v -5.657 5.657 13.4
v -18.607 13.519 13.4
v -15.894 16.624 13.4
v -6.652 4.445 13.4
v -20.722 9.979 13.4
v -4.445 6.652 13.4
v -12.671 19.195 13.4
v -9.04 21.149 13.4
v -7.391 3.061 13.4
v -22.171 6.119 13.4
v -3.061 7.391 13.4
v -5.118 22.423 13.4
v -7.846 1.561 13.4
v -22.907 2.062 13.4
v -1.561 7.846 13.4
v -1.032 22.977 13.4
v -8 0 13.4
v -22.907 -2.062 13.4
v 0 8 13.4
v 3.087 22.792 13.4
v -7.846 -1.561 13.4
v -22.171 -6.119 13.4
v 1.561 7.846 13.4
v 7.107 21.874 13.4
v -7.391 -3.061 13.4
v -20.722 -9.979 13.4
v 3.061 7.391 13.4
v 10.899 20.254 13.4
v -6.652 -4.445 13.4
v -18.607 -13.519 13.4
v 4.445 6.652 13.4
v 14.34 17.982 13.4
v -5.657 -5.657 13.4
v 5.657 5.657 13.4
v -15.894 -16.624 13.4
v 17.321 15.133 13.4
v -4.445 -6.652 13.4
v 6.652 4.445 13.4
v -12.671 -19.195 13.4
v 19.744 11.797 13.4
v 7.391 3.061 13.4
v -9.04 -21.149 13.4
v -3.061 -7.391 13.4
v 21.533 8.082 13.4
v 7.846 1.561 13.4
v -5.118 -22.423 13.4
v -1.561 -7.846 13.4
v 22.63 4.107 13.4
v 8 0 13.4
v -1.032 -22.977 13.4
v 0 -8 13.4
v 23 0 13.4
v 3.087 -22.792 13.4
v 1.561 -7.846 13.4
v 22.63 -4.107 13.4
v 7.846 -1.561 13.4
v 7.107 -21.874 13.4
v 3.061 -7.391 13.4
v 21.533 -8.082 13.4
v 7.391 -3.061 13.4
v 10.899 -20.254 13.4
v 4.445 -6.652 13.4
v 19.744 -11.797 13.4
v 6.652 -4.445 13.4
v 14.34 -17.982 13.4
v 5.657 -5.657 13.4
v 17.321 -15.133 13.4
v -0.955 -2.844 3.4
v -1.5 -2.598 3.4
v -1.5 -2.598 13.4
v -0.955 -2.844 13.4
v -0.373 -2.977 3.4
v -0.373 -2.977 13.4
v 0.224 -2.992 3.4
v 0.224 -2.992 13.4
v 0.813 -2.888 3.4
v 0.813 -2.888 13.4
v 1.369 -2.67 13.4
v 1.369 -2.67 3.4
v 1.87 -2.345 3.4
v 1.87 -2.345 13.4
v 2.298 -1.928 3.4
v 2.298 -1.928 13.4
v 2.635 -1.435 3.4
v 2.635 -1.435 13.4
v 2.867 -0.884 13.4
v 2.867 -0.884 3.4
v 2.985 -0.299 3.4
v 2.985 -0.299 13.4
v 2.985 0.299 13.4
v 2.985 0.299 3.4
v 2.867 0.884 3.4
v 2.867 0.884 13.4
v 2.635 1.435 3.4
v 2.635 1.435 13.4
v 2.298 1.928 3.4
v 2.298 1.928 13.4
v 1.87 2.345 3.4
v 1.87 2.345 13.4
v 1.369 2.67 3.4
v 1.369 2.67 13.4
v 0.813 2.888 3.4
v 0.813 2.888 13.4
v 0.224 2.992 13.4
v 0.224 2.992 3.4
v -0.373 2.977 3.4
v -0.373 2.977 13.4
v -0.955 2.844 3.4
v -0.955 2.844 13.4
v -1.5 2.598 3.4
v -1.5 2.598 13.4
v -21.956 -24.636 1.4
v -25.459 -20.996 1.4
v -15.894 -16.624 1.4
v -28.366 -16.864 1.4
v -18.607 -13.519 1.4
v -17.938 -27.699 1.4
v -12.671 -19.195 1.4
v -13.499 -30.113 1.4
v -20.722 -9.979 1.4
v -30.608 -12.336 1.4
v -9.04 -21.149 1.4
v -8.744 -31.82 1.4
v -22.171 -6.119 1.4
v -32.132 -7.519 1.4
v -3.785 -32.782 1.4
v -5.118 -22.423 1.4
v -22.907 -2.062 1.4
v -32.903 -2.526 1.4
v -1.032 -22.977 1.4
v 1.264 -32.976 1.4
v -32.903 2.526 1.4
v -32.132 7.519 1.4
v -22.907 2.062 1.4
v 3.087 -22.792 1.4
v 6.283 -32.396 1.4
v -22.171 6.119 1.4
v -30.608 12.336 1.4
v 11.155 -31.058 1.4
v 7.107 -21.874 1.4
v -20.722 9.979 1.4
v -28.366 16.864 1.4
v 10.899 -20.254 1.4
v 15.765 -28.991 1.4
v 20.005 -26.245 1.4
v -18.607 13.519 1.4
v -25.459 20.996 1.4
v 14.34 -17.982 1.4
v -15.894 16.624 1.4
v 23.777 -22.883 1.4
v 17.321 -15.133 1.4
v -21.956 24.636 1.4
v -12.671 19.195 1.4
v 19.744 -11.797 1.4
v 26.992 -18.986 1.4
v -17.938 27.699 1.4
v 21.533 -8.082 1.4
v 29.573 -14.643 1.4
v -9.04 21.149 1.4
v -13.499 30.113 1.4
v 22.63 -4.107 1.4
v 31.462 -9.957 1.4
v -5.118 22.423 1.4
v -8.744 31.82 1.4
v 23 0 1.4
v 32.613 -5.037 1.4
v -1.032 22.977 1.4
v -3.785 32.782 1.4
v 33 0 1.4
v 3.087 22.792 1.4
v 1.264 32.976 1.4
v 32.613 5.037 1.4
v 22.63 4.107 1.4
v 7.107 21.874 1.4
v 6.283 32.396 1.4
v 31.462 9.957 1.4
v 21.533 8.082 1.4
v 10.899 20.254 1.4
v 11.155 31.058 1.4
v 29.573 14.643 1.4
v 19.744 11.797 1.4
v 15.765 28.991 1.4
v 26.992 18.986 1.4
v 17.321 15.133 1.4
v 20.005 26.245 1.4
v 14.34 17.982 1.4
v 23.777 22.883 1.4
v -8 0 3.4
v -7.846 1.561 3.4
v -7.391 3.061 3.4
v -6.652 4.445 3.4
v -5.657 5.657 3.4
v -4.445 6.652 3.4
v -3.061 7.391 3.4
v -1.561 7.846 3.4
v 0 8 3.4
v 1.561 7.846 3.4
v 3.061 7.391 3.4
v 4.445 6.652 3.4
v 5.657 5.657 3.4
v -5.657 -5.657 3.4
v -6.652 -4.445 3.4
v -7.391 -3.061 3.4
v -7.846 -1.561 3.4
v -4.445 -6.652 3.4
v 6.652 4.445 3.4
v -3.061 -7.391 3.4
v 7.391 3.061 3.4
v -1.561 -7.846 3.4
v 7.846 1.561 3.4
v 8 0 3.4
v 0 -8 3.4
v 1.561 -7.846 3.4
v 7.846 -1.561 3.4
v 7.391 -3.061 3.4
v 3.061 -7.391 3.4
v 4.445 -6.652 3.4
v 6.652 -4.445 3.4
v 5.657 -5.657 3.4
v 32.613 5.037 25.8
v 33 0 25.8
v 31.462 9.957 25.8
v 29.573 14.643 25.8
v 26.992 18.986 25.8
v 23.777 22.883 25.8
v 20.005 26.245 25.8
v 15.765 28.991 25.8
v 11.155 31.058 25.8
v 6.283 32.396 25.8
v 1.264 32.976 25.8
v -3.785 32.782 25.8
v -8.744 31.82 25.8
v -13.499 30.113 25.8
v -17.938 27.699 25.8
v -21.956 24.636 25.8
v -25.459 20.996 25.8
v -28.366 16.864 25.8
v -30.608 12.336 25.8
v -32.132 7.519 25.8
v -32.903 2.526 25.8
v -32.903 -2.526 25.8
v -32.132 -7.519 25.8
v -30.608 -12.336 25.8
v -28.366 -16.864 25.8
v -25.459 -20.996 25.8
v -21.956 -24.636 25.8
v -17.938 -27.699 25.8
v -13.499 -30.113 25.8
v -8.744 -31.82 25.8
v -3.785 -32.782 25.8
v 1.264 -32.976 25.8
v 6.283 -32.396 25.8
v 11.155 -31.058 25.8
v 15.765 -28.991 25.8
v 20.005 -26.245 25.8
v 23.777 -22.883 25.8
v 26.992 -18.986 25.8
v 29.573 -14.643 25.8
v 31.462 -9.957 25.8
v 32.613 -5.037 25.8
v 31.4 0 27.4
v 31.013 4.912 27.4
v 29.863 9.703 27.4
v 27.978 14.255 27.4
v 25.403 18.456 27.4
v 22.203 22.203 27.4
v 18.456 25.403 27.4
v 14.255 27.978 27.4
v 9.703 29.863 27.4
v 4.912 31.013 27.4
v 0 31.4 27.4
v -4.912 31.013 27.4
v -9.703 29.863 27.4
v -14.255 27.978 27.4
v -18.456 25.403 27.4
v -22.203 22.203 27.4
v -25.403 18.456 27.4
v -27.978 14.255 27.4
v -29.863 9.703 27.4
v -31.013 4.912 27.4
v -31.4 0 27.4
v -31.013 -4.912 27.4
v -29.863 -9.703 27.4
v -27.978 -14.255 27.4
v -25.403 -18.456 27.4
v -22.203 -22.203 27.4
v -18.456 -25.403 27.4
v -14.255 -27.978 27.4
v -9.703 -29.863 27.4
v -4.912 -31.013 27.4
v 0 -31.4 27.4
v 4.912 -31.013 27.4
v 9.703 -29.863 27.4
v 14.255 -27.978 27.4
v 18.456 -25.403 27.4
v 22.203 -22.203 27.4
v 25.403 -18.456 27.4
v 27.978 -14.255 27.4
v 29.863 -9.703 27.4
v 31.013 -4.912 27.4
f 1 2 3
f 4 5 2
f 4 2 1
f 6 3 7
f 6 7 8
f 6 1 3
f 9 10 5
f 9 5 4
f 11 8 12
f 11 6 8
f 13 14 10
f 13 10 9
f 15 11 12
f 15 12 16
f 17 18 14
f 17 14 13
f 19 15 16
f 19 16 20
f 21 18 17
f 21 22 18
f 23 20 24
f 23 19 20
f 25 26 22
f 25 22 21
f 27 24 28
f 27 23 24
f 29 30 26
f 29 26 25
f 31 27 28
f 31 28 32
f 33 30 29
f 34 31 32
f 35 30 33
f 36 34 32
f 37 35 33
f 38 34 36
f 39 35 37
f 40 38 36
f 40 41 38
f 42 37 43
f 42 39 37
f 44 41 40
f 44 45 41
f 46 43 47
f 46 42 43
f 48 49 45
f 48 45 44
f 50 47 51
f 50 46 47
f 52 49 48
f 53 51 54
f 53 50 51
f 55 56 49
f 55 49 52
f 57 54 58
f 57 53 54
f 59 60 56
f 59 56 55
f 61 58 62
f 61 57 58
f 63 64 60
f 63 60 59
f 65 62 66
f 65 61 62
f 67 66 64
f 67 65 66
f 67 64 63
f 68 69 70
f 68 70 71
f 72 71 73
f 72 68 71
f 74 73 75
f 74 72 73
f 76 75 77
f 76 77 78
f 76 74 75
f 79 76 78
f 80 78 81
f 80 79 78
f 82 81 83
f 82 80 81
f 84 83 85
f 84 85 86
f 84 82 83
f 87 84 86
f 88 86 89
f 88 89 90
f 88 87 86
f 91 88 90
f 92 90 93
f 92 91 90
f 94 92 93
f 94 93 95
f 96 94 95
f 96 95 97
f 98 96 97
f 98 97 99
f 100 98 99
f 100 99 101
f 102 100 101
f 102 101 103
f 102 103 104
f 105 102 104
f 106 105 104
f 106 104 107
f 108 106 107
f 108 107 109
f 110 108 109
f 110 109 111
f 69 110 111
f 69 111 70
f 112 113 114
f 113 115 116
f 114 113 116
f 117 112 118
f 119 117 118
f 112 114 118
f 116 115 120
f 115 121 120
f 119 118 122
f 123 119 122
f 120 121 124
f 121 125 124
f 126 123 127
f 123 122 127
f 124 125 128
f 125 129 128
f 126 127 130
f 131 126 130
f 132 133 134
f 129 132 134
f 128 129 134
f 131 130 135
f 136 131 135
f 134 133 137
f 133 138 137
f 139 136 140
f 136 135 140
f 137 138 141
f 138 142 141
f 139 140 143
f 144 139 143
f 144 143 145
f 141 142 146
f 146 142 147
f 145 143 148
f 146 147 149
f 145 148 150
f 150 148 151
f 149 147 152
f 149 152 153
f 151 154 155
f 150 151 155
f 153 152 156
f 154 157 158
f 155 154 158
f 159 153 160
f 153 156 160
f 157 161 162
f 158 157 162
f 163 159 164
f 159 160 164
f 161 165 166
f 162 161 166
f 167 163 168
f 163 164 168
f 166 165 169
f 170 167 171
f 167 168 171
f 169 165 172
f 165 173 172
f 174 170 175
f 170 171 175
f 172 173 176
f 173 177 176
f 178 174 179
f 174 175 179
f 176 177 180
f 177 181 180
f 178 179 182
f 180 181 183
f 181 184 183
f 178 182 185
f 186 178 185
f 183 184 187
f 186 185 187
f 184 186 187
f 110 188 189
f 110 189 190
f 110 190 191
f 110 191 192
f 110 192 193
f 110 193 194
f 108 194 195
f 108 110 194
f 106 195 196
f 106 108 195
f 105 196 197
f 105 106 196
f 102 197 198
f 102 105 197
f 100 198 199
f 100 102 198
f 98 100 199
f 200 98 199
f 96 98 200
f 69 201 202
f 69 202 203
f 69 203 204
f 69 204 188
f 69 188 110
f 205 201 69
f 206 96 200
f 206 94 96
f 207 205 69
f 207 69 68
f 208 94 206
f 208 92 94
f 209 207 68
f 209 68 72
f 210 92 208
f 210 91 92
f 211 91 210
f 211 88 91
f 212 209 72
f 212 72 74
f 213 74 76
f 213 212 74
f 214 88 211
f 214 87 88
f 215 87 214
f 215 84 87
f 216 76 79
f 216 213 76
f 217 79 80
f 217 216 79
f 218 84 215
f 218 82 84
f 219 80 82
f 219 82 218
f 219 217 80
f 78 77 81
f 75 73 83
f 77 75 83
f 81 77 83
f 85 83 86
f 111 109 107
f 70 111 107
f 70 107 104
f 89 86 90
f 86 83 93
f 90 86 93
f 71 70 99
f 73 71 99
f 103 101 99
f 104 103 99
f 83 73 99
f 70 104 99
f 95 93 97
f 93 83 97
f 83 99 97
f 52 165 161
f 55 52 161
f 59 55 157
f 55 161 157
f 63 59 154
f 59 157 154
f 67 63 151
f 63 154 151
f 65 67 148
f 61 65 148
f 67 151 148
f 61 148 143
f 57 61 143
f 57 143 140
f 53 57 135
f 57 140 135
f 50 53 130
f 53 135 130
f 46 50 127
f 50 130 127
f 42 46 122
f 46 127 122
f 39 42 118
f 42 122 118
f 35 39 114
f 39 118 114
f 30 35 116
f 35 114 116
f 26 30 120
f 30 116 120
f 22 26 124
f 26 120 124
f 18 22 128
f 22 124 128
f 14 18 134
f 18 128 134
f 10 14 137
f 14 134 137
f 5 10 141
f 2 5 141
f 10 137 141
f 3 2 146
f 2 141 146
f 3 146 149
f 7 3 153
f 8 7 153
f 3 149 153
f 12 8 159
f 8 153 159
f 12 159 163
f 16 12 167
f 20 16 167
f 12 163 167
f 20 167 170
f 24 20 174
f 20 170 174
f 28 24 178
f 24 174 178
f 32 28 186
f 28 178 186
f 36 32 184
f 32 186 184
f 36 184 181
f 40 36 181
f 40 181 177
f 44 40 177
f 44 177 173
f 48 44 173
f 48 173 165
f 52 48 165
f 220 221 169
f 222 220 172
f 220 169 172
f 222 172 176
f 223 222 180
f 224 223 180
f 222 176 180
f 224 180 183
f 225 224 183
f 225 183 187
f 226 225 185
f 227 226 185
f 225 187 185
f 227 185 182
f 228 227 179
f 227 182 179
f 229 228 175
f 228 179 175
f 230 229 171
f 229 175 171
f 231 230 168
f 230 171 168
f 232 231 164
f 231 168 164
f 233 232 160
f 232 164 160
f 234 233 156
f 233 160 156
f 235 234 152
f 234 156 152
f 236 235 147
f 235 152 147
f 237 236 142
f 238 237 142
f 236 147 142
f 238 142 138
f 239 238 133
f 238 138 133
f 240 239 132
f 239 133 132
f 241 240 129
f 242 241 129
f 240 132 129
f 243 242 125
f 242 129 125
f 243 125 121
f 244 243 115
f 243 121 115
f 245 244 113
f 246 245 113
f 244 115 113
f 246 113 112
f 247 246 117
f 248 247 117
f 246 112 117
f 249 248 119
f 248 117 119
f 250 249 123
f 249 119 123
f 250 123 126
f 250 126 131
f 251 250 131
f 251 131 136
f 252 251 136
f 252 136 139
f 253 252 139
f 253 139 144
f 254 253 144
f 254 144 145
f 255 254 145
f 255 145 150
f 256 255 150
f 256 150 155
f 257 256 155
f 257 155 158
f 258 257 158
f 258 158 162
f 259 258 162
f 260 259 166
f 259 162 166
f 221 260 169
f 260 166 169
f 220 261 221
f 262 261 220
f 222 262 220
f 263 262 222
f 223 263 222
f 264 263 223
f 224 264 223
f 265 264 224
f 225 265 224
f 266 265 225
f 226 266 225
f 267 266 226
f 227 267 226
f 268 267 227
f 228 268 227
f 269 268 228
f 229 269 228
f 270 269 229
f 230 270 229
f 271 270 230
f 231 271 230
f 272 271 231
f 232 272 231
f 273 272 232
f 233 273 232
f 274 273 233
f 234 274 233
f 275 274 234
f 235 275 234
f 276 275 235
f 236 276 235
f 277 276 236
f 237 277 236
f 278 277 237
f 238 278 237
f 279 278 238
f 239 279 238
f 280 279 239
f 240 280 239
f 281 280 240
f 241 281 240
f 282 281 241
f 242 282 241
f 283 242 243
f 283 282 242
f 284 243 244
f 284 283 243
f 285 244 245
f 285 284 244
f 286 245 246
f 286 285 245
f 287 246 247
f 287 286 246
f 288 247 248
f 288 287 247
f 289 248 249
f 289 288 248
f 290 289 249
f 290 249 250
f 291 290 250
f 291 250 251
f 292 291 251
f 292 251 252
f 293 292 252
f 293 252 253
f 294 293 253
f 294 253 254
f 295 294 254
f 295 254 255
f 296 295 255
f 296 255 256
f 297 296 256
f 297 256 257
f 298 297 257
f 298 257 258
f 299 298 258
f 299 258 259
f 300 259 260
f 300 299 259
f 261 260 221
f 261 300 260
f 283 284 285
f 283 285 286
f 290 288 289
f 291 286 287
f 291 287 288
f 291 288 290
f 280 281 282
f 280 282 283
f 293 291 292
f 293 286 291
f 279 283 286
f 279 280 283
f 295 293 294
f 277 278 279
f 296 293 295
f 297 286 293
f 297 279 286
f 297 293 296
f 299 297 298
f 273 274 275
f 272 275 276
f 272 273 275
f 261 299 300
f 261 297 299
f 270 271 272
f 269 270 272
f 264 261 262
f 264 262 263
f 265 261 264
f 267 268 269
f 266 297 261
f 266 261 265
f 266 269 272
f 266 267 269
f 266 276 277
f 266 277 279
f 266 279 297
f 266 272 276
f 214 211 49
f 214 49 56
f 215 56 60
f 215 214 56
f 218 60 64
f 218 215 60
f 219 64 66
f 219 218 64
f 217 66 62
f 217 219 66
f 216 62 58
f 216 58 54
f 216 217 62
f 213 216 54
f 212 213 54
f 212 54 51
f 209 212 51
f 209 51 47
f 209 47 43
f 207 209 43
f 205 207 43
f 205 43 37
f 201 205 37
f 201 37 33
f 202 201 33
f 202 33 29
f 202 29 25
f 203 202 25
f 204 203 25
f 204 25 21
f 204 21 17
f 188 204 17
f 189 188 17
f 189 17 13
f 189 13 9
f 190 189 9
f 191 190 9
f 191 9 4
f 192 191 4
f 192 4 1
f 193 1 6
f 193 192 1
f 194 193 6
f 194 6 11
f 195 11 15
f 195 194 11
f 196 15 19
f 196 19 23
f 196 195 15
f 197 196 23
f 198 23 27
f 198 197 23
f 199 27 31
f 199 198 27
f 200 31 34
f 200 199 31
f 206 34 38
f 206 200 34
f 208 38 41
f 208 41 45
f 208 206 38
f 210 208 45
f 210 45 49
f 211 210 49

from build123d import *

# Parameters (mm, degrees)
SKETCH_R        = 33
PAD_DEPTH       = 26
POCKET_DEPTH    = 12
SKETCH002_R     = 23
SKETCH002_R_2   = 8
POCKET001_DEPTH = 12
SKETCH003_R     = 8
POCKET002_DEPTH = 2
CHAMFER_SIZE    = 1.6


with BuildPart() as part:
    # Sketch → Pad (new body)
    with BuildSketch(Plane.XY):
        Circle(SKETCH_R)
    extrude(amount=PAD_DEPTH)

    # Sketch001 → Pocket (cut)
    with BuildSketch(Plane.XY):
        with BuildLine():
            ThreePointArc((-1.5, -2.598076), (3, 0), (-1.5, 2.598076))
            Line((-1.5, 2.598076), (-1.5, -2.598076))
        make_face()
    extrude(amount=POCKET_DEPTH, mode=Mode.SUBTRACT)

    # Sketch002 (on Face2 of Pad) → Pocket001 (cut)
    with BuildSketch(Plane(origin=(0, 0, 0), x_dir=(1, 0, 0), z_dir=(0, 0, -1))):
        Circle(SKETCH002_R)
        Circle(SKETCH002_R_2, mode=Mode.SUBTRACT)
    extrude(amount=-POCKET001_DEPTH, mode=Mode.SUBTRACT)

    # Sketch003 (on Face7 of Pocket001) → Pocket002 (cut)
    with BuildSketch(Plane(origin=(0, 0, 0), x_dir=(1, 0, 0), z_dir=(0, 0, -1))):
        Circle(SKETCH003_R)
    extrude(amount=-POCKET002_DEPTH, mode=Mode.SUBTRACT)

    # Chamfer
    chamfer_edges = [part.edges().sort_by_distance(p)[0] for p in [
        (-33, 0, 26),
    ]]
    chamfer(chamfer_edges, length=CHAMFER_SIZE)


with BuildPart() as part_1:
    # Body placement: moved
    add(part.part.moved(Location((0, 0, 1.4))))


solid = part_1.part
